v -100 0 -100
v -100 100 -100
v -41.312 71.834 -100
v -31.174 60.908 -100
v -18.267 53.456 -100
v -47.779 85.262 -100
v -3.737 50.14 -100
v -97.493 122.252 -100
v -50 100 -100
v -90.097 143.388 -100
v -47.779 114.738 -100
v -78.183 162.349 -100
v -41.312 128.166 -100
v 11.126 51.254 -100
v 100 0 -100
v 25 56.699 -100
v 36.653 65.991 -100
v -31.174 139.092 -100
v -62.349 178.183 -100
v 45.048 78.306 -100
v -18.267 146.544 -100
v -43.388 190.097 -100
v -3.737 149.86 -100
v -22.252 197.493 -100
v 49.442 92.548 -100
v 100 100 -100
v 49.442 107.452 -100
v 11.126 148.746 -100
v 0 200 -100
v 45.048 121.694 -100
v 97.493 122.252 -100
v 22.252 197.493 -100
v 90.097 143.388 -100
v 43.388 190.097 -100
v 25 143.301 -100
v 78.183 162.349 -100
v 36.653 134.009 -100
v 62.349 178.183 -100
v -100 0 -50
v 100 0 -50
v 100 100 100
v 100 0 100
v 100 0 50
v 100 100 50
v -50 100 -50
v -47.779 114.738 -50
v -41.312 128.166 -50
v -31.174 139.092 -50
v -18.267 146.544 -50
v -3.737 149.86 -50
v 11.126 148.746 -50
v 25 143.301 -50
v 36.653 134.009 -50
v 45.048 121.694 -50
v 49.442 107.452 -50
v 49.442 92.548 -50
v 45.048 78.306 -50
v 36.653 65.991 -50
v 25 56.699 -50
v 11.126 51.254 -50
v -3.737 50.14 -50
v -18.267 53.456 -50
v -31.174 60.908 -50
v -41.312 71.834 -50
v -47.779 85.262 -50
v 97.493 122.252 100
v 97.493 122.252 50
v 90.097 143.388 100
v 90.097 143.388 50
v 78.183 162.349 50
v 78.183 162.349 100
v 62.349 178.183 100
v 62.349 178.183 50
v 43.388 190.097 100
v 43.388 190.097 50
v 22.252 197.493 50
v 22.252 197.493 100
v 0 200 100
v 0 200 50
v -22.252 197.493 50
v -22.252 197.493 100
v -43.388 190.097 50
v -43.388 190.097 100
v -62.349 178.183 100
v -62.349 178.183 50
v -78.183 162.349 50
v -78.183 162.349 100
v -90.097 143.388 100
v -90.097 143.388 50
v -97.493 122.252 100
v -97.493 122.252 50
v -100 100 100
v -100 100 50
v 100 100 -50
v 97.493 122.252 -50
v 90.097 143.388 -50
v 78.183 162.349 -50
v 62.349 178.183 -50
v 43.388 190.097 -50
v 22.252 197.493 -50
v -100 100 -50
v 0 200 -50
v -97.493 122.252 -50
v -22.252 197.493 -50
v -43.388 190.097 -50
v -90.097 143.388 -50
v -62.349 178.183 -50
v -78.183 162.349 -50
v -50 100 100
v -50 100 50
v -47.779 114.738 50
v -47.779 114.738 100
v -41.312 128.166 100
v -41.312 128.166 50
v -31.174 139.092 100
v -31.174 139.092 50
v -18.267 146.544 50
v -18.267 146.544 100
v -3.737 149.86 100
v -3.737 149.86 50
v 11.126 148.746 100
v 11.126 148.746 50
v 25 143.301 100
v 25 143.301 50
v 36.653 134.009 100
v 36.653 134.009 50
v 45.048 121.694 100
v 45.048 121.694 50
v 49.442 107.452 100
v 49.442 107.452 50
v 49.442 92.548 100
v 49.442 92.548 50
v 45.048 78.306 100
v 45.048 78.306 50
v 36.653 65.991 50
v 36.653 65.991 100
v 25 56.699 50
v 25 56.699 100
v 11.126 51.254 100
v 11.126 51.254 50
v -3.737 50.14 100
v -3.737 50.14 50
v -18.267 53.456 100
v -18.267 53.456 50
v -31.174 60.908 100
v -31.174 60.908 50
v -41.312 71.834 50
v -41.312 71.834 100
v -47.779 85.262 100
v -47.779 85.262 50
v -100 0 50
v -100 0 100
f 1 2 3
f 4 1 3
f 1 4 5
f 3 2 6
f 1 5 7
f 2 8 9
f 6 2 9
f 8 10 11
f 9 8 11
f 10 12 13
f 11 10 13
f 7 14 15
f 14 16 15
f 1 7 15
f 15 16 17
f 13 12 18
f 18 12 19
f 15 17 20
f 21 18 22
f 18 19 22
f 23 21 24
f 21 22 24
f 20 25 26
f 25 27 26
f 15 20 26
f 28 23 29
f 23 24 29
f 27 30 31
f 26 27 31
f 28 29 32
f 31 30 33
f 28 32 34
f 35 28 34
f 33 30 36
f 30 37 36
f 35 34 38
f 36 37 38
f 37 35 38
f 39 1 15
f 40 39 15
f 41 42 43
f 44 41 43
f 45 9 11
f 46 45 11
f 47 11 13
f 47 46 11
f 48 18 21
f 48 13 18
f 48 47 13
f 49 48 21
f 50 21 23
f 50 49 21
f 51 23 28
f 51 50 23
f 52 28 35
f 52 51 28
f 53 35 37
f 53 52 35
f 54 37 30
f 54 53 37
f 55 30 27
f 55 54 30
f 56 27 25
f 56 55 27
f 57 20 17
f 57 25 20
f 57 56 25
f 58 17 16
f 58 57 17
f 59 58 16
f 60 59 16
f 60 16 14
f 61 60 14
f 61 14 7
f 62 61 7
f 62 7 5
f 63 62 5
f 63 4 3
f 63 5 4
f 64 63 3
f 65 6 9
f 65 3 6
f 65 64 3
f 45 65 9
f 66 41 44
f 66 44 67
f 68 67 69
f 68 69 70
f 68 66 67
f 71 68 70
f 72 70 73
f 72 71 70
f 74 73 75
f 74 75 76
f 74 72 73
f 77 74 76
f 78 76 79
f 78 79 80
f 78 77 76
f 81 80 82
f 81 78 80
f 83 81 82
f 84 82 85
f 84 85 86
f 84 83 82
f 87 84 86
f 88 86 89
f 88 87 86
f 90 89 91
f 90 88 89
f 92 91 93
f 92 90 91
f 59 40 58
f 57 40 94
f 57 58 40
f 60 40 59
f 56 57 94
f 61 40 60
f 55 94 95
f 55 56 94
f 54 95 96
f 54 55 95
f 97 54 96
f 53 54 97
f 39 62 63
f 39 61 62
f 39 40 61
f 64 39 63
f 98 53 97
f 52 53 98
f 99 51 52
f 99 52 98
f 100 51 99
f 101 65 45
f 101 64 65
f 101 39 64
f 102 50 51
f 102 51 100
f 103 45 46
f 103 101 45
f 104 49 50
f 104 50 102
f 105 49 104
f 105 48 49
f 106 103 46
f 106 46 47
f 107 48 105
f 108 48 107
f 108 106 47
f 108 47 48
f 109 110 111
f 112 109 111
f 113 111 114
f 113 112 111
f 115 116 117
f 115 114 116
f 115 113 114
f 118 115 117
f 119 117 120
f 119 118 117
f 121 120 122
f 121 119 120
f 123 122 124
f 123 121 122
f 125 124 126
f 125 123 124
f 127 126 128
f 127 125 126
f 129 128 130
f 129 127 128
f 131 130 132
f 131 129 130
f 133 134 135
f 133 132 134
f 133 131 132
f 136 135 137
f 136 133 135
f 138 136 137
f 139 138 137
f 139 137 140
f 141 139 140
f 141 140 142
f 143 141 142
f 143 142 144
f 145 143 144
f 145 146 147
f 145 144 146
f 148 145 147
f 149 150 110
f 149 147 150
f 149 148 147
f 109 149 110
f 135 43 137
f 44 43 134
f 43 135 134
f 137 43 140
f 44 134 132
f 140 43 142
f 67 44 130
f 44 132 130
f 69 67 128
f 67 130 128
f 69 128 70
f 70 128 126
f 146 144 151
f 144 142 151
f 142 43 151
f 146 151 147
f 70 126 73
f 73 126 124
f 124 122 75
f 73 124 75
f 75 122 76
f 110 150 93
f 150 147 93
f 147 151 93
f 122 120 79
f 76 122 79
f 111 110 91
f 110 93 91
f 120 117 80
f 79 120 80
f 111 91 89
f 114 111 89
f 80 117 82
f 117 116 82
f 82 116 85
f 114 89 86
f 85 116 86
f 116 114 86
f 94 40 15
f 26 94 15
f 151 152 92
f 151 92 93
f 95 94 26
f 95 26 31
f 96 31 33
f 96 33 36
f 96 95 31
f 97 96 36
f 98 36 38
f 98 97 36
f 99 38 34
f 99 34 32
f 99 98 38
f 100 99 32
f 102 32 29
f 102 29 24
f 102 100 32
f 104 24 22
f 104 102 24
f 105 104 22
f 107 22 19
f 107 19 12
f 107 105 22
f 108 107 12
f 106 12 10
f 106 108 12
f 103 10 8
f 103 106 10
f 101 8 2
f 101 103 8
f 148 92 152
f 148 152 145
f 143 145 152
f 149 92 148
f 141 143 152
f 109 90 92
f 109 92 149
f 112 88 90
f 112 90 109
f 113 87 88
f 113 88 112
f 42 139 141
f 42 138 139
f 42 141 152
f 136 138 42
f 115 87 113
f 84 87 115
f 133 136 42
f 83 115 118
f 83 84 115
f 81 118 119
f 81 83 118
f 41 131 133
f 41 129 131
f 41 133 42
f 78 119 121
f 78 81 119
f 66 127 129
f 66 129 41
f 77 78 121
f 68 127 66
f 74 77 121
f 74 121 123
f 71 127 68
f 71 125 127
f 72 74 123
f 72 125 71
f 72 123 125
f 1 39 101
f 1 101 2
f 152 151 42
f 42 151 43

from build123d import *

# Parameters (mm, degrees)
SKETCH_1_W               = 200
SKETCH_1_H               = 200
EXTRUDE_1_DEPTH          = 100
EXTRUDE_2_DEPTH          = 100
CUT_EXTRUDE_1_DEPTH      = 245.948974278
CUT_EXTRUDE_1_DEPTH_BACK = 245.948974278
SKETCH_4_W               = 100
SKETCH_4_H               = 200
CUT_EXTRUDE_2_DEPTH      = 301
CUT_EXTRUDE_2_DEPTH_BACK = 301
SKETCH_5_R               = 50


with BuildPart() as part:
    # 草图1 → 凸台-拉伸1 (new body)
    with BuildSketch(Plane(origin=(0, 0, 0), x_dir=(1, 0, 0), z_dir=(0, 1, 0))):
        Rectangle(SKETCH_1_W, SKETCH_1_H)
    extrude(amount=EXTRUDE_1_DEPTH)

    # 草图2 → 凸台-拉伸2 (add, symmetric)
    with BuildSketch(Plane.XY):
        with BuildLine():
            Line((-100, 100), (100, 100))
            ThreePointArc((100, 100), (0, 200), (-100, 100))
        make_face()
    extrude(amount=EXTRUDE_2_DEPTH, both=True)

    # 草图4 → 切除-拉伸1 (cut, two sides: drawn at the far end of the back side and taken through both)
    with BuildSketch(Plane(origin=(0, 0, 0), x_dir=(0, 0, -1), z_dir=(1, 0, 0)).offset(-CUT_EXTRUDE_1_DEPTH_BACK)):
        with Locations((0, 100)):
            Rectangle(SKETCH_4_W, SKETCH_4_H)
    extrude(amount=CUT_EXTRUDE_1_DEPTH + CUT_EXTRUDE_1_DEPTH_BACK, mode=Mode.SUBTRACT)


with BuildPart() as cut_extrude_1_piece_1:
    # of the separate pieces the step leaves, piece 1, a body of its own (cut_extrude_1_pieces)
    add(part.part.solids().sort_by_distance((-100, 0, 100))[0])


with BuildPart() as cut_extrude_1_piece_2:
    # of the separate pieces the step leaves, piece 2, a body of its own (cut_extrude_1_pieces)
    add(part.part.solids().sort_by_distance((-100, 0, -100))[0])


with BuildPart() as cut_extrude_2_tool:
    # 草图5 → 切除-拉伸2 (new, two sides: drawn at the far end of the back side and taken through both)
    with BuildSketch(Plane(origin=(0, 0, -100), x_dir=(-1, 0, 0), z_dir=(0, 0, -1)).offset(-CUT_EXTRUDE_2_DEPTH_BACK)):
        with Locations((0, 100)):
            Circle(SKETCH_5_R)
    extrude(amount=CUT_EXTRUDE_2_DEPTH + CUT_EXTRUDE_2_DEPTH_BACK)


with BuildPart() as cut_extrude_1_piece_1_1:
    add(cut_extrude_1_piece_1.part)

    # 切除-拉伸2: cut by cut_extrude_2_tool
    add(cut_extrude_2_tool.part, mode=Mode.SUBTRACT)


with BuildPart() as cut_extrude_1_piece_2_1:
    add(cut_extrude_1_piece_2.part)

    # 切除-拉伸2: cut by cut_extrude_2_tool
    add(cut_extrude_2_tool.part, mode=Mode.SUBTRACT)


solid = Compound([cut_extrude_1_piece_1_1.part, cut_extrude_1_piece_2_1.part])
